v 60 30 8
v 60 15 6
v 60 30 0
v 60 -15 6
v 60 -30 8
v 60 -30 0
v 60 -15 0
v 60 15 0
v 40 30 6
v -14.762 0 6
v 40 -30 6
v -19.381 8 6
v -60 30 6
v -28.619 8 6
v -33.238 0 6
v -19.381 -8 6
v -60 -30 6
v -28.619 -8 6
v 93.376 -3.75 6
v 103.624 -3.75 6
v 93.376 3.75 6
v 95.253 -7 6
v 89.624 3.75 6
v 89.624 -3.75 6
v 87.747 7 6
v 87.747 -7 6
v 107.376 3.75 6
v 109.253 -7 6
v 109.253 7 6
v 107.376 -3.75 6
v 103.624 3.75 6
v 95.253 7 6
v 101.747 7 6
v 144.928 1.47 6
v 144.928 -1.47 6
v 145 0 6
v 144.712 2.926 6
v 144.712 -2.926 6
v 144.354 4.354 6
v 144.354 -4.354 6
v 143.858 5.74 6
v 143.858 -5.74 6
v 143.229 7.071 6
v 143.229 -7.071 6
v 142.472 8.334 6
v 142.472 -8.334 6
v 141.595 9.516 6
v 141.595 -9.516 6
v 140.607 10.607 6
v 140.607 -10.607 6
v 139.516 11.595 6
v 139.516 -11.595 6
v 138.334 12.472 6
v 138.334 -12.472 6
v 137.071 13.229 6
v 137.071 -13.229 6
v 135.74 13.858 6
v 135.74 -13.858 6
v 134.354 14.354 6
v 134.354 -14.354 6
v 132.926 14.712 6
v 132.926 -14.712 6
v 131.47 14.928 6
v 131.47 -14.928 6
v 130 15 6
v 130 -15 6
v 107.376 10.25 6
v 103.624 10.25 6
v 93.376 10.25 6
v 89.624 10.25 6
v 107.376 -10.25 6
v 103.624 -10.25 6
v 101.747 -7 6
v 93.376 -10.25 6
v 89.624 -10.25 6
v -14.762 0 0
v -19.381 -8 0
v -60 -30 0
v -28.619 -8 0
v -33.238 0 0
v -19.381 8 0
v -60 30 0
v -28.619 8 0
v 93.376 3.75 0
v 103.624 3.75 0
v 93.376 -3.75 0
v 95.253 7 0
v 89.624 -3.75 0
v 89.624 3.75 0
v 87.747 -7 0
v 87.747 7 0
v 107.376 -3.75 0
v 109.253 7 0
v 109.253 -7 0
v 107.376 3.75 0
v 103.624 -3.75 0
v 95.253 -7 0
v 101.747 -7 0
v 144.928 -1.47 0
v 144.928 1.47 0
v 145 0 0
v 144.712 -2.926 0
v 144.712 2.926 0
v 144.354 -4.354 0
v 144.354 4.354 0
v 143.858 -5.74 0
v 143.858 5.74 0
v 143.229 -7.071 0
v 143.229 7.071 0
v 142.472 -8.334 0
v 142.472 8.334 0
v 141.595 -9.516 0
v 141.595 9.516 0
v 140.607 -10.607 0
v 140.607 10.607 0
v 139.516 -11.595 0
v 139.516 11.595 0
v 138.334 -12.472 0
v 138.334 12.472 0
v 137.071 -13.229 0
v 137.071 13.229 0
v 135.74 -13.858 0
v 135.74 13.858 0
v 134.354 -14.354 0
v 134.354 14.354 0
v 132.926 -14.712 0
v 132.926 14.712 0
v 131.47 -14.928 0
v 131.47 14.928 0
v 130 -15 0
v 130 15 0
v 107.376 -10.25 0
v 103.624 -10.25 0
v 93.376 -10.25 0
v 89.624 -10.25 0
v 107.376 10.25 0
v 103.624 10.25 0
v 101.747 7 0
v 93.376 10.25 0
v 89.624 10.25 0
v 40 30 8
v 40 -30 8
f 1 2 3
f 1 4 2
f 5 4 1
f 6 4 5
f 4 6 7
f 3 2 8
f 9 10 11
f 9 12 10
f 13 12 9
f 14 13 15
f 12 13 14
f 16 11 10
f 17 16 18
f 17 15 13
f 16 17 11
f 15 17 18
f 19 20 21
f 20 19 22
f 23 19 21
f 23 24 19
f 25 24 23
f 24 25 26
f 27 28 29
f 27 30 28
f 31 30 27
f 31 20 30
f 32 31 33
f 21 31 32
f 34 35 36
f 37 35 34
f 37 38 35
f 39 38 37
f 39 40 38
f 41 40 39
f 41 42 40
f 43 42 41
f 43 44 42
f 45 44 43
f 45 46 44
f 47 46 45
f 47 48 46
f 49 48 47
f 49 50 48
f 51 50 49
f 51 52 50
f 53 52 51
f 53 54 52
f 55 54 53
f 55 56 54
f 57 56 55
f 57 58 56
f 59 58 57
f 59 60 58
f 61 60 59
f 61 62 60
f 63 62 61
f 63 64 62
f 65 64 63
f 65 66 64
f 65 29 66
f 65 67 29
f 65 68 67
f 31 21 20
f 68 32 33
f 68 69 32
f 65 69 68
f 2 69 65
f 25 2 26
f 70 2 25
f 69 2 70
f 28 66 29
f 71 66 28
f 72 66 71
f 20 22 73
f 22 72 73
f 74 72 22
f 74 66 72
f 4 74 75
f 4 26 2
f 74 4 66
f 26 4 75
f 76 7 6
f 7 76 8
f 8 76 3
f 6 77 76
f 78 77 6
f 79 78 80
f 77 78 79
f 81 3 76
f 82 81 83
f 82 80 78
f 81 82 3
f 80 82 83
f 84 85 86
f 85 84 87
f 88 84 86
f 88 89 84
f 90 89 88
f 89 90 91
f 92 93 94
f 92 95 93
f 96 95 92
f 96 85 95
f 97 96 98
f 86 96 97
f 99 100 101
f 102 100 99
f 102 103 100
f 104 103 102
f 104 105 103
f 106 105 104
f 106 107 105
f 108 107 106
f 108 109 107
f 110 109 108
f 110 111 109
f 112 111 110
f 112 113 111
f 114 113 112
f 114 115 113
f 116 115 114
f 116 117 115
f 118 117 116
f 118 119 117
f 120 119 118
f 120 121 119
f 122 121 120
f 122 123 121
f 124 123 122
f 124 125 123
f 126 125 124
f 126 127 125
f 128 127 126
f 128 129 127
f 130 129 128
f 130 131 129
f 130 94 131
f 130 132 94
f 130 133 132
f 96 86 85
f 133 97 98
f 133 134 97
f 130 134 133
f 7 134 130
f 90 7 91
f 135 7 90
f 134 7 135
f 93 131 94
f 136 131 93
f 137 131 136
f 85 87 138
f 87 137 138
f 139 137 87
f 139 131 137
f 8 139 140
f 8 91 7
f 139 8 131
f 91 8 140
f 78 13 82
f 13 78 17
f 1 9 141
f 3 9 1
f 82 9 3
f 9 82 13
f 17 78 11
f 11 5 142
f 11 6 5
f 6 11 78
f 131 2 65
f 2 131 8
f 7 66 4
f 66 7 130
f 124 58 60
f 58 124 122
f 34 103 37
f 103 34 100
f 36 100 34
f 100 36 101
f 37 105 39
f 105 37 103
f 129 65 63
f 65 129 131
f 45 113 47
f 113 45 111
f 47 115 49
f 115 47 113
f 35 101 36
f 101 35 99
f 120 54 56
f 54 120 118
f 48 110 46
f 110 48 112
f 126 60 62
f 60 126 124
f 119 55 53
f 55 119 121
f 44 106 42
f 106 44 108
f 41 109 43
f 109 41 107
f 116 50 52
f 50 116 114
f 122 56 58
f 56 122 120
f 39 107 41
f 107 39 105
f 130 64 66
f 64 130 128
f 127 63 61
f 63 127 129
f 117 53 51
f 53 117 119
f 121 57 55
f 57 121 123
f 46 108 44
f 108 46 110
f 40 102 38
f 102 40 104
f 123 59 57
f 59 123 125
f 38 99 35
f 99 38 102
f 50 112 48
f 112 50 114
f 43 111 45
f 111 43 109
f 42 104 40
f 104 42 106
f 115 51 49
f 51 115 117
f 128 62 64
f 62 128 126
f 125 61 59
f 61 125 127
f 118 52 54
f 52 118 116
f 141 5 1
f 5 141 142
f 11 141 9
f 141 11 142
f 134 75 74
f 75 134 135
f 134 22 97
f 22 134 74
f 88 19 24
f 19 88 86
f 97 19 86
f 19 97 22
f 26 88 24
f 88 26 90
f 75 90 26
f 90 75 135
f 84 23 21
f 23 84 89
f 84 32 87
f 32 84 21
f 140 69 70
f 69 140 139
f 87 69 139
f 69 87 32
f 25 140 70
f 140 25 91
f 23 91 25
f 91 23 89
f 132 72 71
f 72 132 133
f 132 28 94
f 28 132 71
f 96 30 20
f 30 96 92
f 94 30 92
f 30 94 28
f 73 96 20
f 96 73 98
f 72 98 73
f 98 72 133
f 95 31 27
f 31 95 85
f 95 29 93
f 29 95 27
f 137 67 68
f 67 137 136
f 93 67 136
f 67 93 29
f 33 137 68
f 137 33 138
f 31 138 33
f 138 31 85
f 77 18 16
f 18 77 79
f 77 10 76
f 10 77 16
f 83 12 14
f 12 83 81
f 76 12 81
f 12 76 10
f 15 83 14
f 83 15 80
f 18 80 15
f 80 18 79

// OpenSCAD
$fn=64;

plate_th = 6;

body_len = 120;
body_w   = 60;

tongue_len = 70;
tongue_w   = 30;

step_len = 20;

small_hex_flat = 6.5;
large_hex_flat = 16;

small_hex_r = small_hex_flat / sqrt(3);
large_hex_r = large_hex_flat / sqrt(3);

module hex_hole(r, h){
  cylinder(h=h, r=r, $fn=6);
}

module base_profile(){
  union(){
    translate([-(body_len/2), -(body_w/2), 0])
      cube([body_len, body_w, plate_th], center=false);

    translate([(body_len/2), -(tongue_w/2), 0])
      cube([tongue_len, tongue_w, plate_th], center=false);

    translate([(body_len/2 + tongue_len), 0, 0])
      cylinder(h=plate_th, r=tongue_w/2, center=false);
  }
}

module stepped_plate(){
  union(){
    base_profile();
    translate([body_len/2 - step_len, -(body_w/2), plate_th])
      cube([step_len, body_w, 2], center=false);
  }
}

module holes(){
  // Large hex hole on wide section
  translate([-body_len*0.20, 0, -1])
    hex_hole(large_hex_r, plate_th + 4);

  // Four small hex holes near rounded end in 2x2 pattern
  x0 = body_len/2 + tongue_len*0.55;
  dx = 14;
  dy = 14;

  for (ix=[-0.5, 0.5])
    for (iy=[-0.5, 0.5])
      translate([x0 + ix*dx, iy*dy, -1])
        hex_hole(small_hex_r, plate_th + 4);
}

difference(){
  stepped_plate();
  holes();
}
